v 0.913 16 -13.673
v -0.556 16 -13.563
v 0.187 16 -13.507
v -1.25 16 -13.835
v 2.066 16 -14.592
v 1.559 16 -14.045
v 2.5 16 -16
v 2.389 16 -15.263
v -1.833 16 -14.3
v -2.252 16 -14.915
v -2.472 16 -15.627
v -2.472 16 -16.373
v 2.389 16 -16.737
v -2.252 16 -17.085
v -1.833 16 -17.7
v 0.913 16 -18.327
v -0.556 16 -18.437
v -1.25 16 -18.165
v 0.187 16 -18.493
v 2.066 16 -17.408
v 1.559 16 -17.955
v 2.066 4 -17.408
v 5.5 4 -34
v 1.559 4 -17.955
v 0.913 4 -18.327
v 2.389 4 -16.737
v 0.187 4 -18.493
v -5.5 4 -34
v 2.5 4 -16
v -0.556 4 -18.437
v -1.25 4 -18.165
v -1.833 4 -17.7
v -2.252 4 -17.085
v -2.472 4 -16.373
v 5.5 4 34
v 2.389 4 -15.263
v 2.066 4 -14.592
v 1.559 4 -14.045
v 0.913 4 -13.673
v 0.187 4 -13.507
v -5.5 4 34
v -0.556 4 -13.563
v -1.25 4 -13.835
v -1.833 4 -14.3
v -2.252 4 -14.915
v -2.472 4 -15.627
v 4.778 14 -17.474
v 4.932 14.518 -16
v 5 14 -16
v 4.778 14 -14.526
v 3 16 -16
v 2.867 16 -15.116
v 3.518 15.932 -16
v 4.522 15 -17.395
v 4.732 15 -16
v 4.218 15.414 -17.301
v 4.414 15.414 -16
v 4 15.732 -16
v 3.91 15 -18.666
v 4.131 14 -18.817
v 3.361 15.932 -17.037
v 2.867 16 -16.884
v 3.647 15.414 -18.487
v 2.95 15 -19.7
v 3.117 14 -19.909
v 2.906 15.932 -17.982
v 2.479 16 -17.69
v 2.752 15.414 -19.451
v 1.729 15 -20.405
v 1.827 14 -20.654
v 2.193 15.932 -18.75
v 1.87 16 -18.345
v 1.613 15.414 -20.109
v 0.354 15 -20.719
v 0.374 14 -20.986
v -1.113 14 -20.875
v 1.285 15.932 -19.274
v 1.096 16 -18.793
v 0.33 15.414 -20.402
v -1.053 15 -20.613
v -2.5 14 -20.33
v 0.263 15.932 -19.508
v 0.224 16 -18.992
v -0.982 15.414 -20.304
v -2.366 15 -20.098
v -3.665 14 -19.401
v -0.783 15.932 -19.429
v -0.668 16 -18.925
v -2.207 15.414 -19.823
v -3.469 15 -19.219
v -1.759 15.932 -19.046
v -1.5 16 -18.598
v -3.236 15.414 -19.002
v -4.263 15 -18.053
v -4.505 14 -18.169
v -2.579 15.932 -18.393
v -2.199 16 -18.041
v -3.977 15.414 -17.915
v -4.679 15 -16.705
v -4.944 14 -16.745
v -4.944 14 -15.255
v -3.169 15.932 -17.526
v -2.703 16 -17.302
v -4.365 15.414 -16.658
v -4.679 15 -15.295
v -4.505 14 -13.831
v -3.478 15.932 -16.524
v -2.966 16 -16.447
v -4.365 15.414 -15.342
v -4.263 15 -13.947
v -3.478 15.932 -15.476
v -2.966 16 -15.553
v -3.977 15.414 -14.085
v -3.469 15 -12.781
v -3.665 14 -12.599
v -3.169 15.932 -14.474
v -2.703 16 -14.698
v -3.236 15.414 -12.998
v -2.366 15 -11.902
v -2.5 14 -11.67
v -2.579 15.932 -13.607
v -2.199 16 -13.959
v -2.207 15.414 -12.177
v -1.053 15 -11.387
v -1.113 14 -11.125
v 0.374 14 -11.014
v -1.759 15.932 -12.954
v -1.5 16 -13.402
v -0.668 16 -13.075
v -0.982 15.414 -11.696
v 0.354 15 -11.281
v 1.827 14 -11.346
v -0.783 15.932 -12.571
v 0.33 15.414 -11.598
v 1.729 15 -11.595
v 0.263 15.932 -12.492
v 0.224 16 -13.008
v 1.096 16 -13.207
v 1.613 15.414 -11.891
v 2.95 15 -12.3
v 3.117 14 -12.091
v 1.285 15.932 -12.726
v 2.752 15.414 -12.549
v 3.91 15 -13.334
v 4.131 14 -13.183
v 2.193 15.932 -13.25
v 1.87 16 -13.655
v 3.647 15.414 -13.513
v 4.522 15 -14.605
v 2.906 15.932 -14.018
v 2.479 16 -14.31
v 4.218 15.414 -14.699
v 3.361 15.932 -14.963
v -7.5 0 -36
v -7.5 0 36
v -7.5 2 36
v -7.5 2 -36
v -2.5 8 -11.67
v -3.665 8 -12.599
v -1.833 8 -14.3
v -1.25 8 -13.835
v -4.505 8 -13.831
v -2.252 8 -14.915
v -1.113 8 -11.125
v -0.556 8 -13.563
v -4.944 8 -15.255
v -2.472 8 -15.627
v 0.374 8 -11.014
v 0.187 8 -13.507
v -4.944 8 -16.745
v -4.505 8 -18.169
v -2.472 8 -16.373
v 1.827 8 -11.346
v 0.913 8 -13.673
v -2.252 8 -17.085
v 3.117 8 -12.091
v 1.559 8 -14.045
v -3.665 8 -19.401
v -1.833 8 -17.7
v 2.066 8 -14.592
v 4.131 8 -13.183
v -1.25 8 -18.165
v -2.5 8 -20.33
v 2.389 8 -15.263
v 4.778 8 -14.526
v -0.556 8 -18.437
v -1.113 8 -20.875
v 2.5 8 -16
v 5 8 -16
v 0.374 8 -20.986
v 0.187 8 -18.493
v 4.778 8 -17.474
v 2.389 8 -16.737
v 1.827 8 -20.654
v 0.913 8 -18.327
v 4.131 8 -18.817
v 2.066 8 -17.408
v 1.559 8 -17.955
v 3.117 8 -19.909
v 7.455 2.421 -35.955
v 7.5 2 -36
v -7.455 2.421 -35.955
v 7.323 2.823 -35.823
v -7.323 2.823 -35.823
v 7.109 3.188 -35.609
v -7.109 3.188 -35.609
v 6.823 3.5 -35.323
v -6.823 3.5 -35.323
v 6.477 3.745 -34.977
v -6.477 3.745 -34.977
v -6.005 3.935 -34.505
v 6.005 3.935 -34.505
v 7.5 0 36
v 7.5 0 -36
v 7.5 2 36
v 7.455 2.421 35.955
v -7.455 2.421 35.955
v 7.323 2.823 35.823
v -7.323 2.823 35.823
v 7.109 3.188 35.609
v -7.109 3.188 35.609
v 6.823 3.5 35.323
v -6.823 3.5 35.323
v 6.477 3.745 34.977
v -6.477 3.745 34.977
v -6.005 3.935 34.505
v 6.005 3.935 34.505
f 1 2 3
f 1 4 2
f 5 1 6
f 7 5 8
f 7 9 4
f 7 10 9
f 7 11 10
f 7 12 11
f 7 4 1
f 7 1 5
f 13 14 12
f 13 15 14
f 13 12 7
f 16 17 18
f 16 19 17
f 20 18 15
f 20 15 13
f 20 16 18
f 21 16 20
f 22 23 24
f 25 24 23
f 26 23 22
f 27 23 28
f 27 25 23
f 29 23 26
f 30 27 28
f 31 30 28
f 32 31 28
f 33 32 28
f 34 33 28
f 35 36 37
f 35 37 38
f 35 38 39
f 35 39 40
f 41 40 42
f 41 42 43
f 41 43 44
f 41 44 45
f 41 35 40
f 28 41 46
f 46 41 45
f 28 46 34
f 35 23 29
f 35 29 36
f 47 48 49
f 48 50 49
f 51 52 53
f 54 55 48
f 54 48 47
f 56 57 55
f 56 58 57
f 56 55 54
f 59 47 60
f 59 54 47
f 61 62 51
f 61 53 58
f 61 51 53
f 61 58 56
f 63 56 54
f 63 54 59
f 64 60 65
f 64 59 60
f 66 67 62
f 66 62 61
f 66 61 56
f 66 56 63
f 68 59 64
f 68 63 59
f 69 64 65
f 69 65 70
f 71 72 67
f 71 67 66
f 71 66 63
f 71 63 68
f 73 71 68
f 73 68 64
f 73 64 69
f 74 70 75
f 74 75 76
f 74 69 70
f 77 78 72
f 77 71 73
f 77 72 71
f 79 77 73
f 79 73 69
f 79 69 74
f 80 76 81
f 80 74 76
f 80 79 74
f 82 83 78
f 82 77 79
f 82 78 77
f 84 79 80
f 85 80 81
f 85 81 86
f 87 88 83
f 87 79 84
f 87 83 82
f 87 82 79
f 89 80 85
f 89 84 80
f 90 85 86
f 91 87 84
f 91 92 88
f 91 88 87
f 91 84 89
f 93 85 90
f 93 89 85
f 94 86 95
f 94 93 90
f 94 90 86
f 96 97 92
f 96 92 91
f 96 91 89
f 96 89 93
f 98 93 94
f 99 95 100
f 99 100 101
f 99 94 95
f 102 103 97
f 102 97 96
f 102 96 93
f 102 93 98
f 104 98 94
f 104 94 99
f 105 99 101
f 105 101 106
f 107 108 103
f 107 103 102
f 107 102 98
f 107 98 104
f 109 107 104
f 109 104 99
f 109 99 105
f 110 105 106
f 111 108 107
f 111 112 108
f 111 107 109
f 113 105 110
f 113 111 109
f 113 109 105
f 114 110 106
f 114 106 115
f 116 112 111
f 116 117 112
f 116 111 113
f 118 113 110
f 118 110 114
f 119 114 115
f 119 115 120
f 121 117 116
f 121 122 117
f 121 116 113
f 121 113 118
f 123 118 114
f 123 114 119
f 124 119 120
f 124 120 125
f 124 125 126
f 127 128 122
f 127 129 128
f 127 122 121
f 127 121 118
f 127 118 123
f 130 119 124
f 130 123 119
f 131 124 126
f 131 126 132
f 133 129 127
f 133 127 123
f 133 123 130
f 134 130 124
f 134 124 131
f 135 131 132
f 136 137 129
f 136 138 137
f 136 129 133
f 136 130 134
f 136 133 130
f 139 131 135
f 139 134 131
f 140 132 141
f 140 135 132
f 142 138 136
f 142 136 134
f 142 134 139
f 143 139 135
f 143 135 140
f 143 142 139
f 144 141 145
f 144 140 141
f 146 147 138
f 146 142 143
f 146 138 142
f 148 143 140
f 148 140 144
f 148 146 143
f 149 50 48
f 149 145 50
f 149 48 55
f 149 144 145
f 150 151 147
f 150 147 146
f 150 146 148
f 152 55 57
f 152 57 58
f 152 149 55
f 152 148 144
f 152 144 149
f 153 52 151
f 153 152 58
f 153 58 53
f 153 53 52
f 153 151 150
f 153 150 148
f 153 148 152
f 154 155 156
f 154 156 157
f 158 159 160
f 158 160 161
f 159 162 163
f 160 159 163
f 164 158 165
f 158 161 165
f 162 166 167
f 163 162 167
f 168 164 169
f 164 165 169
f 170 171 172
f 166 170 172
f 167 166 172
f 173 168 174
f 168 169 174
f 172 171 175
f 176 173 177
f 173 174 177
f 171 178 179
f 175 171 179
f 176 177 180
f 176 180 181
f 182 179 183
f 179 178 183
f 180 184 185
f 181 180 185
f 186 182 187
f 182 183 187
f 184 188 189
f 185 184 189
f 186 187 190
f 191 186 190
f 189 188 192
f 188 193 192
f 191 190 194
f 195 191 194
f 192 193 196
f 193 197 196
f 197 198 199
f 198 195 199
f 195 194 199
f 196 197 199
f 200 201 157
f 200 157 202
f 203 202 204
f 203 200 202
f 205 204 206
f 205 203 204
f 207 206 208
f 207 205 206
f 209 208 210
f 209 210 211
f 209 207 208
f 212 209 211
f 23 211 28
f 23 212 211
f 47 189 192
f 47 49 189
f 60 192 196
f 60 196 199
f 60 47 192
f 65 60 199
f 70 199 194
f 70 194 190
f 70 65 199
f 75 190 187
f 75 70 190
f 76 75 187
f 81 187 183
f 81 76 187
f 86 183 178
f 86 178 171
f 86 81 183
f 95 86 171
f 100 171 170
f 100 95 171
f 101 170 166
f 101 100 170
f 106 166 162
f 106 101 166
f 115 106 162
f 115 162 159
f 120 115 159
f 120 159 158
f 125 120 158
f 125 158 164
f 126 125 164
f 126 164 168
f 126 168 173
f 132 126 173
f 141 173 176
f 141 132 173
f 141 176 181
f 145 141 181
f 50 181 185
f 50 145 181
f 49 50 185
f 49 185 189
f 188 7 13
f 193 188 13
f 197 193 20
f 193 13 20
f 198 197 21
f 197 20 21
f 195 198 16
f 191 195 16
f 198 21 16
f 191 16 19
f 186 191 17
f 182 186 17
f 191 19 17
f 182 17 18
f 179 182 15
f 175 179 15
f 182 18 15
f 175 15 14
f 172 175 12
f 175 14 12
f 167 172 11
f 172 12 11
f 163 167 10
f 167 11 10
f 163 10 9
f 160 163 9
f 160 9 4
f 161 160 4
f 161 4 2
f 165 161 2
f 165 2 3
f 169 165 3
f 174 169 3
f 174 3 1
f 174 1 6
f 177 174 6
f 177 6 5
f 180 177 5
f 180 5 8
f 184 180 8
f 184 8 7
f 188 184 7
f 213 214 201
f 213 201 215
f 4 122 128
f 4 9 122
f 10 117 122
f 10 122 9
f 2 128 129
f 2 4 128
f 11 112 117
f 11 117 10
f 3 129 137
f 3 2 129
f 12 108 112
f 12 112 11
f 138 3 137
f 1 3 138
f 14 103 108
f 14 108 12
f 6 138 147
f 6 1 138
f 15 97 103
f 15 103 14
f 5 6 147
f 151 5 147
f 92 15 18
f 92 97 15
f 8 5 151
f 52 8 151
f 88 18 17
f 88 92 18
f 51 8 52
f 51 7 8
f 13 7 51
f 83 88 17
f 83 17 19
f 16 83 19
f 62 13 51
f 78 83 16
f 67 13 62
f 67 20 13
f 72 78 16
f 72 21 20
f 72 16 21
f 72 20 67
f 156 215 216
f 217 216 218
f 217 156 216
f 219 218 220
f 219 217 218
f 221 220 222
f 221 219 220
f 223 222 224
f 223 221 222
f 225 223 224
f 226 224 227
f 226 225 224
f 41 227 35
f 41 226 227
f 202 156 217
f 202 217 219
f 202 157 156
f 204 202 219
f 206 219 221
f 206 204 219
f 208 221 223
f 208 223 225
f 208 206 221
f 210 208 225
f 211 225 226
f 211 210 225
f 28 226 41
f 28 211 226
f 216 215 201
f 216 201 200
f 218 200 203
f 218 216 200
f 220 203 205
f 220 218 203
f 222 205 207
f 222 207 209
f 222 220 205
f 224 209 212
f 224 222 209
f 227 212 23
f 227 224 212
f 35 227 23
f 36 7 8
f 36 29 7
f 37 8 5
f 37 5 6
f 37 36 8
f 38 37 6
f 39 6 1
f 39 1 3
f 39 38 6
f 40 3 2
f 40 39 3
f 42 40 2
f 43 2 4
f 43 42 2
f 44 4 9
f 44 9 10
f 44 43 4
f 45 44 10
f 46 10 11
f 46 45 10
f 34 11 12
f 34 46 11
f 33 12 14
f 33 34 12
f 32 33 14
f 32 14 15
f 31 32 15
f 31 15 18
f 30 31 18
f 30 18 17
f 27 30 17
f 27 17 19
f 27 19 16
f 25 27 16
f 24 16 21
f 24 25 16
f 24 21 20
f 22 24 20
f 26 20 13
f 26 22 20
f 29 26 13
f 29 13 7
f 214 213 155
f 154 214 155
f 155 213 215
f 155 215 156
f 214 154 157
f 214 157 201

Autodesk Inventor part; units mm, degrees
ref_plane "YZ Plane" through (0, 0, 0) normal (1, 0, 0) x (0, 1, 0)
ref_plane "XZ Plane" through (0, 0, 0) normal (0, 1, 0) x (-1, 0, 0)
ref_plane "XY Plane" through (0, 0, 0) normal (0, 0, 1) x (1, 0, 0)
sketch "Sketch1" plane through (0, 0, 0) normal (0, 1, 0) x (-1, 0, 0)
  line L0 (-7.5, 36) -> (7.5, 36)
  line L1 (7.5, 36) -> (7.5, -36)
  line L2 (7.5, -36) -> (-7.5, -36)
  line L3 (-7.5, -36) -> (-7.5, 36)
  line L4 (-7.5, 36) -> (7.5, -36) construction
  line L5 (7.5, 36) -> (-7.5, -36) construction
  point P0 (0, 0)
  dimension "d0" = 15
  dimension "d1" = 72
extrude "Extrusion1" add sketch "Sketch1" along normal blind 4
fillet "Fillet1" radius 2 4 edges at (0, 4, 36) (7.5, 4, 0) (-7.5, 4, 0) (0, 4, -36)
sketch "Sketch2" plane through (0, 4, 0) normal (0, 1, 0) x (1, 0, 0)
  line L0 (7.5, 36) -> (-7.5, 36) projected
  line L1 (0, 36) -> (0, 16)
  circle A0 centre (0, 16) radius 2.5
  dimension "d7" = 20
  dimension "d8" = 5
extrude "Extrusion2" add sketch "Sketch2" along normal blind 12
sketch "Sketch3" plane through (0, 16, -16) normal (0, 1, 0) x (1, 0, 0)
  circle A0 centre (0, 0) radius 2.5 projected
  circle A1 centre (0, 0) radius 5
  point P0 (0, -16)
  dimension "d11" = 10
extrude "Extrusion3" add sketch "Sketch3" against normal blind 8 separate body
fillet "Fillet2" radius 2 1 edges at (-5, 16, -16)
properties part number "Pieza1 Pasador"
